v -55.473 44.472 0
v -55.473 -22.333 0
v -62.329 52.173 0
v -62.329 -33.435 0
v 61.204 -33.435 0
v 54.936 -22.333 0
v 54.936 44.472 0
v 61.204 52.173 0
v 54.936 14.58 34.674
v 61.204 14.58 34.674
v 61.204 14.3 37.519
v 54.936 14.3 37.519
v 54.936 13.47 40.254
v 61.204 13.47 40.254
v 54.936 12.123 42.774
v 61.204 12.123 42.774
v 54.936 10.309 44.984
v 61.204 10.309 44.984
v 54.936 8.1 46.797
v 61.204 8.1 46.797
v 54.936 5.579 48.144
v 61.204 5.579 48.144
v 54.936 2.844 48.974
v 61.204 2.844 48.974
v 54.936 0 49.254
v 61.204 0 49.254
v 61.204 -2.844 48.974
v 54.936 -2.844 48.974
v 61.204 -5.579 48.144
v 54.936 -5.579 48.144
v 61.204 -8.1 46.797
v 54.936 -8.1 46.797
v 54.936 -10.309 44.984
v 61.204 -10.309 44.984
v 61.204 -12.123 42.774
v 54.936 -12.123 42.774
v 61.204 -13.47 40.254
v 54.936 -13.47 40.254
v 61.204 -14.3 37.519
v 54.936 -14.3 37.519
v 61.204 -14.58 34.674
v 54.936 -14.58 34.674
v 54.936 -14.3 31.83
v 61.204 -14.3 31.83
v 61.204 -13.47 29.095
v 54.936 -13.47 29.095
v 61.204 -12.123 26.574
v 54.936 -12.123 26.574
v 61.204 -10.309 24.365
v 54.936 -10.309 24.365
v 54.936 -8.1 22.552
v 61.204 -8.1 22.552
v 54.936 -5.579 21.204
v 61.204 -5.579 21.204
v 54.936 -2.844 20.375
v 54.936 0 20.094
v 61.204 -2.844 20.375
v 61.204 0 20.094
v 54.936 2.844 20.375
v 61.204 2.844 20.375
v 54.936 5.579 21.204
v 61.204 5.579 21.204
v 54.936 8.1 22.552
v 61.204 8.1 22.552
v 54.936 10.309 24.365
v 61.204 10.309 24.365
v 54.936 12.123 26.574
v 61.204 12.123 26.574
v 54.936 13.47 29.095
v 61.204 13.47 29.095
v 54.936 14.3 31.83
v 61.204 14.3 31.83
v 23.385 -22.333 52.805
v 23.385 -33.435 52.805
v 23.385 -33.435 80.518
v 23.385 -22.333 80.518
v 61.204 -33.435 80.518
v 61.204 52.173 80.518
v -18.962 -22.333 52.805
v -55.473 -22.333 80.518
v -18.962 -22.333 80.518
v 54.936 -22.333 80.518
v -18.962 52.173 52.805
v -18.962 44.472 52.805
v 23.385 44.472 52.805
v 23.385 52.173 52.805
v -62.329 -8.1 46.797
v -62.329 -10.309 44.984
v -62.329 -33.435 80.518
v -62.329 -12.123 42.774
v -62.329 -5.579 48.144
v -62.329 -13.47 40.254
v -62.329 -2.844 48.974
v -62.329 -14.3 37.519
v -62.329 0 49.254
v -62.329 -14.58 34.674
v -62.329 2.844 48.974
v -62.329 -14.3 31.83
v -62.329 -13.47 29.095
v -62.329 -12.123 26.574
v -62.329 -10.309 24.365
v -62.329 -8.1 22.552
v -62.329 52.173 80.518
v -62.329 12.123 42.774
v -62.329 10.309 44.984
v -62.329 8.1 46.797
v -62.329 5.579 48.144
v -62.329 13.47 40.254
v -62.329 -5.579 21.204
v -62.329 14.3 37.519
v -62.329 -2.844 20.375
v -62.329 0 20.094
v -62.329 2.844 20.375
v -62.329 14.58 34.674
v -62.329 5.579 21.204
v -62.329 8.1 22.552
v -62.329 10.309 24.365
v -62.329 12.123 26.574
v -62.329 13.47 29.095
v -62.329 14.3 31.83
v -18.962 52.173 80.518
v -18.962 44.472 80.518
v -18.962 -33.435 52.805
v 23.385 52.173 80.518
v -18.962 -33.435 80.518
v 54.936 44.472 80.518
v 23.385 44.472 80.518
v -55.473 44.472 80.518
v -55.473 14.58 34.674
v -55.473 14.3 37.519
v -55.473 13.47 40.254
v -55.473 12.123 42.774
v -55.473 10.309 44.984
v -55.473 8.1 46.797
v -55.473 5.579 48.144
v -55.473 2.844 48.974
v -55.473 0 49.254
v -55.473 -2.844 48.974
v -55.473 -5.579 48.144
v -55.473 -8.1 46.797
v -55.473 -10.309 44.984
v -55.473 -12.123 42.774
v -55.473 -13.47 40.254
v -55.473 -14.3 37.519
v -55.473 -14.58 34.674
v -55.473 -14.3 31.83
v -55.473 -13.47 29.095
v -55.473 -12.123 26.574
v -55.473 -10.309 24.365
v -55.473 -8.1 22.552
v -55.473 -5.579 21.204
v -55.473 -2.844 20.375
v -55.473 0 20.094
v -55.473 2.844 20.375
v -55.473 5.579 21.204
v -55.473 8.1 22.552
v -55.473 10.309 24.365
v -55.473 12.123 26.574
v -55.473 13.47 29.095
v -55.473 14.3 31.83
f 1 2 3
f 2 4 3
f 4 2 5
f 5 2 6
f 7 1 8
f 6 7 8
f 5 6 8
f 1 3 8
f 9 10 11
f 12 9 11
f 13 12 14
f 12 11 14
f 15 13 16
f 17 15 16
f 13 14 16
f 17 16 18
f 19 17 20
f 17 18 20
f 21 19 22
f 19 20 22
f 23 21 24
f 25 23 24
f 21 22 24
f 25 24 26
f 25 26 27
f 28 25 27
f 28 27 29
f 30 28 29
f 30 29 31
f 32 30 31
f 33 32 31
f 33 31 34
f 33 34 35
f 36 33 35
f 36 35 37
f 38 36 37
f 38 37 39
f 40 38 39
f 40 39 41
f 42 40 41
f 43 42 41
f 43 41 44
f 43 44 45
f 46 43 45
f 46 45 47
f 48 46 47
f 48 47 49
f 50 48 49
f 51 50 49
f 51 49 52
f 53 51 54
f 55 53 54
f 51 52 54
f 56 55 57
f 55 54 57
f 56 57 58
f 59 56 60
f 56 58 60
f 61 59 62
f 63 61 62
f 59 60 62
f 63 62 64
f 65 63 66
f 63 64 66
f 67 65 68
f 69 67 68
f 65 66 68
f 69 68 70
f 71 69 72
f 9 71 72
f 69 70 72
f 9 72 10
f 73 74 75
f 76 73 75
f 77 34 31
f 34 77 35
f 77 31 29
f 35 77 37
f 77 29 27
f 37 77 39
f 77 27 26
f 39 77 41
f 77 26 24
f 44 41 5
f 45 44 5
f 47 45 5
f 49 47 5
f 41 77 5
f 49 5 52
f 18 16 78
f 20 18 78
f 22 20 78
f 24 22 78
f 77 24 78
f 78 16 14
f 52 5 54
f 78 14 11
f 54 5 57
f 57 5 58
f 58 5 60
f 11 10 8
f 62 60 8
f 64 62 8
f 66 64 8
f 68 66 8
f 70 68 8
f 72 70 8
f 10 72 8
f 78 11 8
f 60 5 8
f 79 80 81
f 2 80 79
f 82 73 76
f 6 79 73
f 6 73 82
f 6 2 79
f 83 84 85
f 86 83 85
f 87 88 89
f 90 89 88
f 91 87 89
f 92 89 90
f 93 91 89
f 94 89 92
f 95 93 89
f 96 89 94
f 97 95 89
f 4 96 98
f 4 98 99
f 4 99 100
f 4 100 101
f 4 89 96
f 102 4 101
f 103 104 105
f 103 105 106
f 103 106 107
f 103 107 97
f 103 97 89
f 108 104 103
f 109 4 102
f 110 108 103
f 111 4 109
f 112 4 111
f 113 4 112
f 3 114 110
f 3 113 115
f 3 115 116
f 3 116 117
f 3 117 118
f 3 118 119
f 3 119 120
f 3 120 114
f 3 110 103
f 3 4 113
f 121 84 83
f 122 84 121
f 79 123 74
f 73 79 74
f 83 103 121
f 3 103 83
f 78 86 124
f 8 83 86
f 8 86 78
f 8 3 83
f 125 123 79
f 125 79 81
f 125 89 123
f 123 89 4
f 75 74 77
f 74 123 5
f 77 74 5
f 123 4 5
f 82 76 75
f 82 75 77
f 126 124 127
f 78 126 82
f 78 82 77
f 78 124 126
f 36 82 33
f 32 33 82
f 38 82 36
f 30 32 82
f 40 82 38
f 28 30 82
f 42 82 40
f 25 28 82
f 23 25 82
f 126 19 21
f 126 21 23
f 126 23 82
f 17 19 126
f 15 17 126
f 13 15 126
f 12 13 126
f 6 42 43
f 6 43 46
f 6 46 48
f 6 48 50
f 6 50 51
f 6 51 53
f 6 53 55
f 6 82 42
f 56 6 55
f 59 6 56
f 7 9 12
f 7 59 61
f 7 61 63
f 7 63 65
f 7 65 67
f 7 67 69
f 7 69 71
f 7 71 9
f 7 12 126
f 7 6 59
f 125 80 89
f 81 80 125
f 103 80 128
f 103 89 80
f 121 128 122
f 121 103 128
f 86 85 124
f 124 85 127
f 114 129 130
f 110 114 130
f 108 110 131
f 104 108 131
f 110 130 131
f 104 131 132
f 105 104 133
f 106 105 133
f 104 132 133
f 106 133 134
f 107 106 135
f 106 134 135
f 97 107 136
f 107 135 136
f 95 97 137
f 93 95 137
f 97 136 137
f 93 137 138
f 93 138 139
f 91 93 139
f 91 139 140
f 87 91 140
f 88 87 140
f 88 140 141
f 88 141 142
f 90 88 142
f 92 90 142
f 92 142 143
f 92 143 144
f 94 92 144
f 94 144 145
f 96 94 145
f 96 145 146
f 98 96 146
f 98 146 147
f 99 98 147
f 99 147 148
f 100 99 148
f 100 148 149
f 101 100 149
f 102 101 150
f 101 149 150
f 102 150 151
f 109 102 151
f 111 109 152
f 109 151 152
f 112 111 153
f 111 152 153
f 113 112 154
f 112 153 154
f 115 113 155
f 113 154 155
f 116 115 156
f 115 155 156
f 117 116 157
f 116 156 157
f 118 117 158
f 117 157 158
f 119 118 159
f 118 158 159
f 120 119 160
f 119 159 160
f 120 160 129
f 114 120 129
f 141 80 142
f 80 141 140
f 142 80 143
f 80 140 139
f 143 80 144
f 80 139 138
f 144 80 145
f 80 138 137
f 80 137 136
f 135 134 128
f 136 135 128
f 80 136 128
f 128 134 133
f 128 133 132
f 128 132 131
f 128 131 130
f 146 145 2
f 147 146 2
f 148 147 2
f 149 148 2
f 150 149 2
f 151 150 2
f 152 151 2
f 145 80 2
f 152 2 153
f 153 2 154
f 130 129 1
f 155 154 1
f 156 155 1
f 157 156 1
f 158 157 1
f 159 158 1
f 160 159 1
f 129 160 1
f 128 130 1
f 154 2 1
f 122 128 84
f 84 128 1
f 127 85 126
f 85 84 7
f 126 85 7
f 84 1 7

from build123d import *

# Parameters (mm, degrees)
F0_W     = 123.5331967473
F0_H     = 85.607599467
F0_W_2   = 110.4088798165
F0_H_2   = 66.8058078736
F1_DEPTH = 80.518
F2_W     = 42.3468332738
F2_H     = 27.7133138709
F3_DEPTH = 85.608599467
F4_R     = 14.5797051929
F5_DEPTH = 123.5341967473


with BuildPart() as f1:
    # F0 (on Top) → F1 (new body)
    with BuildSketch(Plane.XY):
        with Locations((-0.5623660982, 9.3691665679)):
            Rectangle(F0_W, F0_H)
        with Locations((-0.2685114741, 11.0694328323)):
            Rectangle(F0_W_2, F0_H_2, mode=Mode.SUBTRACT)
    extrude(amount=F1_DEPTH)

    # F2 (on face) → F3 (cut, through all)
    with BuildSketch(Plane.XZ.offset(33.4346331656)):
        with Locations((2.2117001936, 66.6613430645)):
            Rectangle(F2_W, F2_H)
    extrude(amount=-F3_DEPTH, mode=Mode.SUBTRACT)

    # F4 (on face) → F5 (cut, through all)
    with BuildSketch(Plane.YZ.offset(61.2042322755)):
        with Locations((0, 34.6741601825)):
            Circle(F4_R)
    extrude(amount=-F5_DEPTH, mode=Mode.SUBTRACT)


solid = f1.part
